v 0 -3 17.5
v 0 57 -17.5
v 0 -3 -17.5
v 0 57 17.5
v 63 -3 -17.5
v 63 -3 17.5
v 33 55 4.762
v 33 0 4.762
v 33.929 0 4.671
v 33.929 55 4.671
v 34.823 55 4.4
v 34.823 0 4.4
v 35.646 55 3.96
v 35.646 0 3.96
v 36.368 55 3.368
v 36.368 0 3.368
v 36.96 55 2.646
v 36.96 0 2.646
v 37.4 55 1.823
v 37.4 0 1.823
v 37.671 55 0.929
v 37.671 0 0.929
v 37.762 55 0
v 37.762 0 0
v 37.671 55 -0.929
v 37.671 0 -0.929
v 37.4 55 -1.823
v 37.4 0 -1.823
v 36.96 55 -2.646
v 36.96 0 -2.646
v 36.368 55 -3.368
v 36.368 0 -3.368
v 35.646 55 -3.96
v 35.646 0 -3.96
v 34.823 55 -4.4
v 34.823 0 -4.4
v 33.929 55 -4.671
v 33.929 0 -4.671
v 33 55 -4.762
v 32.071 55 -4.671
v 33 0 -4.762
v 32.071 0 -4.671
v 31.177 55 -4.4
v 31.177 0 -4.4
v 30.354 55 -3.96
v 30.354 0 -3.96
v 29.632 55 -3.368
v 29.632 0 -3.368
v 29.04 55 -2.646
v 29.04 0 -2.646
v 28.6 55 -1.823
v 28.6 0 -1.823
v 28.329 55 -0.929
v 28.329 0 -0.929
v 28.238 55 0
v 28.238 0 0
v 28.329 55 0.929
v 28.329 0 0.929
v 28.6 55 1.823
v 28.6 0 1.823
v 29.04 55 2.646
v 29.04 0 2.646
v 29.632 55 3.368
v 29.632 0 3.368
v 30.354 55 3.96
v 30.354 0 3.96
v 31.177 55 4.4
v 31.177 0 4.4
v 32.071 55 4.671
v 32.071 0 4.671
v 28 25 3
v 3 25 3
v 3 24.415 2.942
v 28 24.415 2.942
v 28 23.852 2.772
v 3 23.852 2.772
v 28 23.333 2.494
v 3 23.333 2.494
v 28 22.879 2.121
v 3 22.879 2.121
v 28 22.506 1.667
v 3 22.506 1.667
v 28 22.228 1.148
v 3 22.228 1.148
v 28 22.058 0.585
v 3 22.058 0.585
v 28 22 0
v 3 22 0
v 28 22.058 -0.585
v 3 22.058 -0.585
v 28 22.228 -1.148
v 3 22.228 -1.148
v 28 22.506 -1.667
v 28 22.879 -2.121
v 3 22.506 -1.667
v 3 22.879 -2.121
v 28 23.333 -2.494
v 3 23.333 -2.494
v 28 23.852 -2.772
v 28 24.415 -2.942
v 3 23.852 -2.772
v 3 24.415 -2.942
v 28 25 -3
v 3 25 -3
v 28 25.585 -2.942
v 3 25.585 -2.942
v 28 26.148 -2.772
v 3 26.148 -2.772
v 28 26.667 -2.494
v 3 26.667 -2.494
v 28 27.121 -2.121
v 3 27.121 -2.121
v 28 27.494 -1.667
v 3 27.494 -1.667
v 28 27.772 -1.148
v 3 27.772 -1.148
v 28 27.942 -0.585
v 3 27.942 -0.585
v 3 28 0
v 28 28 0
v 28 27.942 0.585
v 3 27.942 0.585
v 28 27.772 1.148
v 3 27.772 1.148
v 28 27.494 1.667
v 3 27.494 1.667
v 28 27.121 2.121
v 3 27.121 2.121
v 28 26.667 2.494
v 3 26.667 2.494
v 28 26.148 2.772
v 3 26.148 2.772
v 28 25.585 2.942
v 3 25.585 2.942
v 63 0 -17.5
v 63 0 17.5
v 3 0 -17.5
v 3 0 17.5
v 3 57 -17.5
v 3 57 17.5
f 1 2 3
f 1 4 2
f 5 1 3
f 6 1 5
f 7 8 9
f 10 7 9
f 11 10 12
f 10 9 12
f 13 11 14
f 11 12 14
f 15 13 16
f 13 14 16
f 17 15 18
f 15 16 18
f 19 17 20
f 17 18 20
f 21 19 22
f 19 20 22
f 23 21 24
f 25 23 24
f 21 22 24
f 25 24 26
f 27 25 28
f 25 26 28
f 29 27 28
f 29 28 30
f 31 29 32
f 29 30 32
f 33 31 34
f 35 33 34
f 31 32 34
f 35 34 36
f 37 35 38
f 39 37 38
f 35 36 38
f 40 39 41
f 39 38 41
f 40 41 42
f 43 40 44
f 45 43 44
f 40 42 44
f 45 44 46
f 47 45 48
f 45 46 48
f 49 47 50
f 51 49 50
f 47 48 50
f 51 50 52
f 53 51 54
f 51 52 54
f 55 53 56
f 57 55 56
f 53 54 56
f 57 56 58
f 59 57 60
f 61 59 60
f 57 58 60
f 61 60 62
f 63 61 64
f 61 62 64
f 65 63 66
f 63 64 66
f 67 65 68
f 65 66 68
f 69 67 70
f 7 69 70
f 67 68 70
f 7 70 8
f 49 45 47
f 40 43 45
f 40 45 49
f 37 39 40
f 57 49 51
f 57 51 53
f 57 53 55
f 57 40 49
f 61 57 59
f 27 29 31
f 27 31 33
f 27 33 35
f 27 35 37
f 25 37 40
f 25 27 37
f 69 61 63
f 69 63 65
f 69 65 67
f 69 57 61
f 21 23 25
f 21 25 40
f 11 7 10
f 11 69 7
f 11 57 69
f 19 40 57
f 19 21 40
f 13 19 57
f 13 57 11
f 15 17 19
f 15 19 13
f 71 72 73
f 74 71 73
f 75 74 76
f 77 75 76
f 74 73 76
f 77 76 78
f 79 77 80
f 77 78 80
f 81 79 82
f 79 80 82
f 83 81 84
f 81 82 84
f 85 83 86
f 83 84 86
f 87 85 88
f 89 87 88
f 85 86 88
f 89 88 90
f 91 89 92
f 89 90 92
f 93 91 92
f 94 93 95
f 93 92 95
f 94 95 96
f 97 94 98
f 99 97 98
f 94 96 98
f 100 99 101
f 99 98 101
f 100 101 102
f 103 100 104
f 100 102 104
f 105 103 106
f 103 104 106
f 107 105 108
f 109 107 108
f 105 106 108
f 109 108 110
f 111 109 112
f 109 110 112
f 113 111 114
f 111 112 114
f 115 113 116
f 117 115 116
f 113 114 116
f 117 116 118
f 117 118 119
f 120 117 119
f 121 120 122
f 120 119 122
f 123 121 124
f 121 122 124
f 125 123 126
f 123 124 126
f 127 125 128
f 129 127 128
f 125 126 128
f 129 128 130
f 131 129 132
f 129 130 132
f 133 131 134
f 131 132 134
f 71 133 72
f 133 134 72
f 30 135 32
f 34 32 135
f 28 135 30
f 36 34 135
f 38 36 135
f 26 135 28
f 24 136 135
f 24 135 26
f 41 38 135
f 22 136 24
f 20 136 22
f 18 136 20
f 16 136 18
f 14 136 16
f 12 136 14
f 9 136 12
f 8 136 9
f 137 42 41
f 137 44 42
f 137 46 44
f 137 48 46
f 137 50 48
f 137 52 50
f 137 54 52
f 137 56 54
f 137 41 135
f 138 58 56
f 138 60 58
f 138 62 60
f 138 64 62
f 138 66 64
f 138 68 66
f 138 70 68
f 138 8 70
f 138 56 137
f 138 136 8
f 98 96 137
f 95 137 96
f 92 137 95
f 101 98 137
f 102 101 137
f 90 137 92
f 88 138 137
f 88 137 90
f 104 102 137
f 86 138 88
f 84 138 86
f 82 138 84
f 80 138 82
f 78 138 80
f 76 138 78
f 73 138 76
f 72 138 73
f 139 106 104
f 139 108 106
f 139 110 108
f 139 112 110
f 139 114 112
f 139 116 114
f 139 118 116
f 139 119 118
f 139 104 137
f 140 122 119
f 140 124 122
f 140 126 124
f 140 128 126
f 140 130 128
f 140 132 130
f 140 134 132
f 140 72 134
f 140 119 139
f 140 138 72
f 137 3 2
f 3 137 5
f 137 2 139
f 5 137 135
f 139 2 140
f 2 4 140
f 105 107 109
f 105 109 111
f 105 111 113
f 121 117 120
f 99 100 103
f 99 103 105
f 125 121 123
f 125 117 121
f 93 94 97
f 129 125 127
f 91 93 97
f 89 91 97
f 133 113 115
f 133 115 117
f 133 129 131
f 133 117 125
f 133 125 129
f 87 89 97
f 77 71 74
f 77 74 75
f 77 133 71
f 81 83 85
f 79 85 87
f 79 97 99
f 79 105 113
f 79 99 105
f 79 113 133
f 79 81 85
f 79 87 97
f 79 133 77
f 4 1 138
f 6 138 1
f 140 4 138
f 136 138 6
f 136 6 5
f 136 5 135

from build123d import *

# Parameters (mm, degrees)
CROQUIS1_W              = 3
CROQUIS1_H              = 57
SALIENTE_EXTRUIR1_DEPTH = 17.5
CROQUIS2_R              = 3
SALIENTE_EXTRUIR2_DEPTH = 25
CROQUIS3_R              = 4.7625
SALIENTE_EXTRUIR3_DEPTH = 55


with BuildPart() as part:
    # Croquis1 → Saliente-Extruir1 (new, symmetric)
    with BuildSketch(Plane.XY):
        with Locations((1.5, 28.5)):
            Rectangle(CROQUIS1_W, CROQUIS1_H)
        Polygon((3, 0), (0, 0), (0, -3), (63, -3), (63, 0), align=None)
    extrude(amount=SALIENTE_EXTRUIR1_DEPTH, both=True)

    # Croquis2 → Saliente-Extruir2 (add)
    with BuildSketch(Plane(origin=(3, 0, 0), x_dir=(0, 0, -1), z_dir=(1, 0, 0))):
        with Locations(Location((0, 25, 0), (0, 0, 180))):
            Circle(CROQUIS2_R)
    extrude(amount=SALIENTE_EXTRUIR2_DEPTH)

    # Croquis3 → Saliente-Extruir3 (add)
    with BuildSketch(Plane(origin=(0, 0, 0), x_dir=(1, 0, 0), z_dir=(0, 1, 0))):
        with Locations(Location((33, 0, 0), (0, 0, 270))):
            Circle(CROQUIS3_R)
    extrude(amount=SALIENTE_EXTRUIR3_DEPTH)


solid = part.part
